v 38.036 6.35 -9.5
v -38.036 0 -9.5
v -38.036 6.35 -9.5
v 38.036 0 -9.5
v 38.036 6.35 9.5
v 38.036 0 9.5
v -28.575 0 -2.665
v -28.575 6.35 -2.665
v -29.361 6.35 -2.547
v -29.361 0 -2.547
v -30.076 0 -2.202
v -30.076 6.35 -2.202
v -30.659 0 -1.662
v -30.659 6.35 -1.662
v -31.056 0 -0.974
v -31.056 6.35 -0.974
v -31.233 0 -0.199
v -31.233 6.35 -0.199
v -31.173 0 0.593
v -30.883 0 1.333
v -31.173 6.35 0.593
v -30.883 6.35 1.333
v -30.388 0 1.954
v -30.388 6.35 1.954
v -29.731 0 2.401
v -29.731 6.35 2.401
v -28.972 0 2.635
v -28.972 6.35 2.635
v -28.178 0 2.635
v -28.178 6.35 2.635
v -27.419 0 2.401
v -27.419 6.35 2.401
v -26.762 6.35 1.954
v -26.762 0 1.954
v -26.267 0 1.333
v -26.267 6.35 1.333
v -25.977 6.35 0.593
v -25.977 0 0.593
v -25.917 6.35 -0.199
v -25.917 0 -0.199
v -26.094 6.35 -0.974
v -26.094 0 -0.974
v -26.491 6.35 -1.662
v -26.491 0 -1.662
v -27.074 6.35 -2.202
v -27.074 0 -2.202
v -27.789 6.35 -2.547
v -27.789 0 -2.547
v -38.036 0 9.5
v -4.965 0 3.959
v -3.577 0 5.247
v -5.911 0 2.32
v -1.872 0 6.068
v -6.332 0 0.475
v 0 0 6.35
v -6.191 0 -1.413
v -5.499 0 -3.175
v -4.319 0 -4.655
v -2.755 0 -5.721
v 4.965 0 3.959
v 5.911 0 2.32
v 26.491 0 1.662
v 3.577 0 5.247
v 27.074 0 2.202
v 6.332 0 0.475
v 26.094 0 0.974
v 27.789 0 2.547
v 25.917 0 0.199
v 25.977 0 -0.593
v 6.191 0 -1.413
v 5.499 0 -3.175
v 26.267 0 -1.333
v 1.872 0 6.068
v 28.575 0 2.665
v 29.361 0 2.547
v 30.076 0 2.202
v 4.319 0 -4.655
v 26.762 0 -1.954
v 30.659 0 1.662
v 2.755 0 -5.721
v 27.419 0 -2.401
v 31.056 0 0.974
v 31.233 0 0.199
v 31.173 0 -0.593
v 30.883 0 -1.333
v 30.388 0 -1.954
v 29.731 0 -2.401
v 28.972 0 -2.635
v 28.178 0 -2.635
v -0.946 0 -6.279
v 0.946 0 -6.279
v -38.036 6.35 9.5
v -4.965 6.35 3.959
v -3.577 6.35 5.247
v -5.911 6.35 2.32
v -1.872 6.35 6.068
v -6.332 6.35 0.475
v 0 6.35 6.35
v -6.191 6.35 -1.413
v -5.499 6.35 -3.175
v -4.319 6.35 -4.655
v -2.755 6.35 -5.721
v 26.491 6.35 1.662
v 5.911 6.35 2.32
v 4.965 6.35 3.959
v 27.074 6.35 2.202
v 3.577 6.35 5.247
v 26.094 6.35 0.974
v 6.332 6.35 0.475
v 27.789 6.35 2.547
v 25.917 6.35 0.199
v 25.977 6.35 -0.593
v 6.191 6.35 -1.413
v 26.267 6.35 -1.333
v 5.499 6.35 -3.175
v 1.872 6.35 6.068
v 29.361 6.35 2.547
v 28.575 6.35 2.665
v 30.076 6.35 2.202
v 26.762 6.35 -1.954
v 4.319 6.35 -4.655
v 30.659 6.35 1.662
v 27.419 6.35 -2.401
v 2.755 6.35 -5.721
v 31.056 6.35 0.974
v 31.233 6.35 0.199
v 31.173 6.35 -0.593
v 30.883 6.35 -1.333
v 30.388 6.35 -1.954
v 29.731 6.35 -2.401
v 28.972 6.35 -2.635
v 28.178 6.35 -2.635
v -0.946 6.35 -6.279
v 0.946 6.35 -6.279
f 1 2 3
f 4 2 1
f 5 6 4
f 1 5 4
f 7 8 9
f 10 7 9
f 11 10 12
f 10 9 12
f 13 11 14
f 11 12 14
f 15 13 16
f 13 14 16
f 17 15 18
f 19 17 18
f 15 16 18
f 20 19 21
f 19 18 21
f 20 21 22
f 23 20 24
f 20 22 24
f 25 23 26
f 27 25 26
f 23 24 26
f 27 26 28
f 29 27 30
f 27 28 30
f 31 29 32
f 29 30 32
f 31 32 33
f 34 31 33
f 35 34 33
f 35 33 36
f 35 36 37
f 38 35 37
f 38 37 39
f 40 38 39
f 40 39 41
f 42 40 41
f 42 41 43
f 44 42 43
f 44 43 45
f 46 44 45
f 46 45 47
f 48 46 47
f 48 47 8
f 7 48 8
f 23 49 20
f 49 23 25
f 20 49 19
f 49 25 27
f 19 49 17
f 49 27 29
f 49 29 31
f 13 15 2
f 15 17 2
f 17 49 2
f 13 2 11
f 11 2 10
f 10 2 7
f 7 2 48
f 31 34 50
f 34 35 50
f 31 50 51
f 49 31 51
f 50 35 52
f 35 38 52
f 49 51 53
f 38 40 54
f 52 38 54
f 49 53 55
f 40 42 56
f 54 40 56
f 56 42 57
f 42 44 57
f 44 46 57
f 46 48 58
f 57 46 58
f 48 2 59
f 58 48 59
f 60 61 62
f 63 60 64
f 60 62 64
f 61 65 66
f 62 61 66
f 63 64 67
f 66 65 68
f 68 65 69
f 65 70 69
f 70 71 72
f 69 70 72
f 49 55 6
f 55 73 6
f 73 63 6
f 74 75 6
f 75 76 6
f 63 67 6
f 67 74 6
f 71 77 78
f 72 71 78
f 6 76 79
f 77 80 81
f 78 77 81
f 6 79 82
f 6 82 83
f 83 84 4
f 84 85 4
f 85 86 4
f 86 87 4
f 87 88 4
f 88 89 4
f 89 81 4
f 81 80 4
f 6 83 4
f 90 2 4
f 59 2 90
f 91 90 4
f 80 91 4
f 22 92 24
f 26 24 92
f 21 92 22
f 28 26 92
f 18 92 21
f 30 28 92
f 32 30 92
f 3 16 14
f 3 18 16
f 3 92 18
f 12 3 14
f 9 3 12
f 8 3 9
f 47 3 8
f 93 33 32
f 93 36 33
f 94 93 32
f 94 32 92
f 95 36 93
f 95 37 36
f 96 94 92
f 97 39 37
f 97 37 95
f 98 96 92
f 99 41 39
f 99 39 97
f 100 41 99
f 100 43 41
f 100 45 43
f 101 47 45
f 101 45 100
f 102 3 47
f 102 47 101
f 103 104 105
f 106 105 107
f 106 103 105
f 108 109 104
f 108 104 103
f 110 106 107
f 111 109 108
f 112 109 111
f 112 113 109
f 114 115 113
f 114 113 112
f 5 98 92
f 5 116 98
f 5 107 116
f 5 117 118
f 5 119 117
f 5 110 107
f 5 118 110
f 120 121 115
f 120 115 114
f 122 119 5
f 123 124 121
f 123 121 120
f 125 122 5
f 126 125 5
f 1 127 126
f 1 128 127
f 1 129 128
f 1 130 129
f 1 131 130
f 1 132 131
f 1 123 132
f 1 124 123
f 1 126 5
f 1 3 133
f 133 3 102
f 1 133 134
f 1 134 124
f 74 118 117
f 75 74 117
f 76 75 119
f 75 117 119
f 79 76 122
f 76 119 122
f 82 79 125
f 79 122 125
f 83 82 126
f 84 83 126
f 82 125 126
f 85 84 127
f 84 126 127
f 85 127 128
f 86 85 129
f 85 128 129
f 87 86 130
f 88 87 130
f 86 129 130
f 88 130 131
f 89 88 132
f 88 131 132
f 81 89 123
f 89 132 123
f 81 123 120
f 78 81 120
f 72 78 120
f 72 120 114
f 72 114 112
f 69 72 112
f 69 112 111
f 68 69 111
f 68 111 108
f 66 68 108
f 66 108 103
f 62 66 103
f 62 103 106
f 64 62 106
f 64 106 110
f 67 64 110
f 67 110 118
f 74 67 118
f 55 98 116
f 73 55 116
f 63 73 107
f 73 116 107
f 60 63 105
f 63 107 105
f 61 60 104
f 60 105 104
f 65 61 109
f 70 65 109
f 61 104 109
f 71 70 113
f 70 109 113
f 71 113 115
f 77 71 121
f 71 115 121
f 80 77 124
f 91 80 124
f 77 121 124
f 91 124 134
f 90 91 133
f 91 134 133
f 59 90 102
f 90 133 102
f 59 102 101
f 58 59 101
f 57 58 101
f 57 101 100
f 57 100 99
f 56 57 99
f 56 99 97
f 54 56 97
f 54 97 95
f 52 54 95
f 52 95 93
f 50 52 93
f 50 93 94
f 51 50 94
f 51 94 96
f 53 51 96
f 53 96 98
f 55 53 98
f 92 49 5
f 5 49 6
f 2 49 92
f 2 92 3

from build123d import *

# Parameters (mm, degrees)
SKETCH1_W           = 76.073
SKETCH1_H           = 19
BOSS_EXTRUDE1_DEPTH = 6.35
CUT_EXTRUDE2_REACH  = 41.716
SKETCH2_R           = 6.35
CUT_EXTRUDE3_REACH  = 41.716
SKETCH4_R           = 2.665


with BuildPart() as part:
    # Sketch1 → Boss-Extrude1 (new body)
    with BuildSketch(Plane(origin=(0, 0, 0), x_dir=(1, 0, 0), z_dir=(0, 1, 0))):
        Rectangle(SKETCH1_W, SKETCH1_H)
    extrude(amount=BOSS_EXTRUDE1_DEPTH)

    # Sketch2 → Cut-Extrude2 (cut, up to next)
    with BuildSketch(Plane(origin=(0, 6.35, 0), x_dir=(1, 0, 0), z_dir=(0, 1, 0)), mode=Mode.PRIVATE) as cut_extrude2_sk1:
        with Locations(Location((0, 0, 0), (0, 0, 270))):
            Circle(SKETCH2_R)
    cut_extrude2_tool1 = extrude(cut_extrude2_sk1.sketch, amount=-CUT_EXTRUDE2_REACH, mode=Mode.PRIVATE) & part.part
    add(cut_extrude2_tool1.solids().sort_by_distance((0, 6.35, 0))[0], mode=Mode.SUBTRACT)

    # Sketch4 → Cut-Extrude3 (cut, up to next)
    with BuildSketch(Plane(origin=(0, 6.35, 0), x_dir=(1, 0, 0), z_dir=(0, 1, 0)), mode=Mode.PRIVATE) as cut_extrude3_sk1:
        with Locations(Location((28.575, 0, 0), (0, 0, 270))):
            Circle(SKETCH4_R)
    cut_extrude3_tool1 = extrude(cut_extrude3_sk1.sketch, amount=-CUT_EXTRUDE3_REACH, mode=Mode.PRIVATE) & part.part
    # Sketch4 → Cut-Extrude3 (cut, up to next)
    with BuildSketch(Plane(origin=(0, 6.35, 0), x_dir=(1, 0, 0), z_dir=(0, 1, 0)), mode=Mode.PRIVATE) as cut_extrude3_sk2:
        with Locations(Location((-28.575, 0, 0), (0, 0, 90))):
            Circle(SKETCH4_R)
    cut_extrude3_tool2 = extrude(cut_extrude3_sk2.sketch, amount=-CUT_EXTRUDE3_REACH, mode=Mode.PRIVATE) & part.part
    add(cut_extrude3_tool1.solids().sort_by_distance((28.575, 6.35, 0))[0], mode=Mode.SUBTRACT)
    add(cut_extrude3_tool2.solids().sort_by_distance((-28.575, 6.35, 0))[0], mode=Mode.SUBTRACT)


solid = part.part
